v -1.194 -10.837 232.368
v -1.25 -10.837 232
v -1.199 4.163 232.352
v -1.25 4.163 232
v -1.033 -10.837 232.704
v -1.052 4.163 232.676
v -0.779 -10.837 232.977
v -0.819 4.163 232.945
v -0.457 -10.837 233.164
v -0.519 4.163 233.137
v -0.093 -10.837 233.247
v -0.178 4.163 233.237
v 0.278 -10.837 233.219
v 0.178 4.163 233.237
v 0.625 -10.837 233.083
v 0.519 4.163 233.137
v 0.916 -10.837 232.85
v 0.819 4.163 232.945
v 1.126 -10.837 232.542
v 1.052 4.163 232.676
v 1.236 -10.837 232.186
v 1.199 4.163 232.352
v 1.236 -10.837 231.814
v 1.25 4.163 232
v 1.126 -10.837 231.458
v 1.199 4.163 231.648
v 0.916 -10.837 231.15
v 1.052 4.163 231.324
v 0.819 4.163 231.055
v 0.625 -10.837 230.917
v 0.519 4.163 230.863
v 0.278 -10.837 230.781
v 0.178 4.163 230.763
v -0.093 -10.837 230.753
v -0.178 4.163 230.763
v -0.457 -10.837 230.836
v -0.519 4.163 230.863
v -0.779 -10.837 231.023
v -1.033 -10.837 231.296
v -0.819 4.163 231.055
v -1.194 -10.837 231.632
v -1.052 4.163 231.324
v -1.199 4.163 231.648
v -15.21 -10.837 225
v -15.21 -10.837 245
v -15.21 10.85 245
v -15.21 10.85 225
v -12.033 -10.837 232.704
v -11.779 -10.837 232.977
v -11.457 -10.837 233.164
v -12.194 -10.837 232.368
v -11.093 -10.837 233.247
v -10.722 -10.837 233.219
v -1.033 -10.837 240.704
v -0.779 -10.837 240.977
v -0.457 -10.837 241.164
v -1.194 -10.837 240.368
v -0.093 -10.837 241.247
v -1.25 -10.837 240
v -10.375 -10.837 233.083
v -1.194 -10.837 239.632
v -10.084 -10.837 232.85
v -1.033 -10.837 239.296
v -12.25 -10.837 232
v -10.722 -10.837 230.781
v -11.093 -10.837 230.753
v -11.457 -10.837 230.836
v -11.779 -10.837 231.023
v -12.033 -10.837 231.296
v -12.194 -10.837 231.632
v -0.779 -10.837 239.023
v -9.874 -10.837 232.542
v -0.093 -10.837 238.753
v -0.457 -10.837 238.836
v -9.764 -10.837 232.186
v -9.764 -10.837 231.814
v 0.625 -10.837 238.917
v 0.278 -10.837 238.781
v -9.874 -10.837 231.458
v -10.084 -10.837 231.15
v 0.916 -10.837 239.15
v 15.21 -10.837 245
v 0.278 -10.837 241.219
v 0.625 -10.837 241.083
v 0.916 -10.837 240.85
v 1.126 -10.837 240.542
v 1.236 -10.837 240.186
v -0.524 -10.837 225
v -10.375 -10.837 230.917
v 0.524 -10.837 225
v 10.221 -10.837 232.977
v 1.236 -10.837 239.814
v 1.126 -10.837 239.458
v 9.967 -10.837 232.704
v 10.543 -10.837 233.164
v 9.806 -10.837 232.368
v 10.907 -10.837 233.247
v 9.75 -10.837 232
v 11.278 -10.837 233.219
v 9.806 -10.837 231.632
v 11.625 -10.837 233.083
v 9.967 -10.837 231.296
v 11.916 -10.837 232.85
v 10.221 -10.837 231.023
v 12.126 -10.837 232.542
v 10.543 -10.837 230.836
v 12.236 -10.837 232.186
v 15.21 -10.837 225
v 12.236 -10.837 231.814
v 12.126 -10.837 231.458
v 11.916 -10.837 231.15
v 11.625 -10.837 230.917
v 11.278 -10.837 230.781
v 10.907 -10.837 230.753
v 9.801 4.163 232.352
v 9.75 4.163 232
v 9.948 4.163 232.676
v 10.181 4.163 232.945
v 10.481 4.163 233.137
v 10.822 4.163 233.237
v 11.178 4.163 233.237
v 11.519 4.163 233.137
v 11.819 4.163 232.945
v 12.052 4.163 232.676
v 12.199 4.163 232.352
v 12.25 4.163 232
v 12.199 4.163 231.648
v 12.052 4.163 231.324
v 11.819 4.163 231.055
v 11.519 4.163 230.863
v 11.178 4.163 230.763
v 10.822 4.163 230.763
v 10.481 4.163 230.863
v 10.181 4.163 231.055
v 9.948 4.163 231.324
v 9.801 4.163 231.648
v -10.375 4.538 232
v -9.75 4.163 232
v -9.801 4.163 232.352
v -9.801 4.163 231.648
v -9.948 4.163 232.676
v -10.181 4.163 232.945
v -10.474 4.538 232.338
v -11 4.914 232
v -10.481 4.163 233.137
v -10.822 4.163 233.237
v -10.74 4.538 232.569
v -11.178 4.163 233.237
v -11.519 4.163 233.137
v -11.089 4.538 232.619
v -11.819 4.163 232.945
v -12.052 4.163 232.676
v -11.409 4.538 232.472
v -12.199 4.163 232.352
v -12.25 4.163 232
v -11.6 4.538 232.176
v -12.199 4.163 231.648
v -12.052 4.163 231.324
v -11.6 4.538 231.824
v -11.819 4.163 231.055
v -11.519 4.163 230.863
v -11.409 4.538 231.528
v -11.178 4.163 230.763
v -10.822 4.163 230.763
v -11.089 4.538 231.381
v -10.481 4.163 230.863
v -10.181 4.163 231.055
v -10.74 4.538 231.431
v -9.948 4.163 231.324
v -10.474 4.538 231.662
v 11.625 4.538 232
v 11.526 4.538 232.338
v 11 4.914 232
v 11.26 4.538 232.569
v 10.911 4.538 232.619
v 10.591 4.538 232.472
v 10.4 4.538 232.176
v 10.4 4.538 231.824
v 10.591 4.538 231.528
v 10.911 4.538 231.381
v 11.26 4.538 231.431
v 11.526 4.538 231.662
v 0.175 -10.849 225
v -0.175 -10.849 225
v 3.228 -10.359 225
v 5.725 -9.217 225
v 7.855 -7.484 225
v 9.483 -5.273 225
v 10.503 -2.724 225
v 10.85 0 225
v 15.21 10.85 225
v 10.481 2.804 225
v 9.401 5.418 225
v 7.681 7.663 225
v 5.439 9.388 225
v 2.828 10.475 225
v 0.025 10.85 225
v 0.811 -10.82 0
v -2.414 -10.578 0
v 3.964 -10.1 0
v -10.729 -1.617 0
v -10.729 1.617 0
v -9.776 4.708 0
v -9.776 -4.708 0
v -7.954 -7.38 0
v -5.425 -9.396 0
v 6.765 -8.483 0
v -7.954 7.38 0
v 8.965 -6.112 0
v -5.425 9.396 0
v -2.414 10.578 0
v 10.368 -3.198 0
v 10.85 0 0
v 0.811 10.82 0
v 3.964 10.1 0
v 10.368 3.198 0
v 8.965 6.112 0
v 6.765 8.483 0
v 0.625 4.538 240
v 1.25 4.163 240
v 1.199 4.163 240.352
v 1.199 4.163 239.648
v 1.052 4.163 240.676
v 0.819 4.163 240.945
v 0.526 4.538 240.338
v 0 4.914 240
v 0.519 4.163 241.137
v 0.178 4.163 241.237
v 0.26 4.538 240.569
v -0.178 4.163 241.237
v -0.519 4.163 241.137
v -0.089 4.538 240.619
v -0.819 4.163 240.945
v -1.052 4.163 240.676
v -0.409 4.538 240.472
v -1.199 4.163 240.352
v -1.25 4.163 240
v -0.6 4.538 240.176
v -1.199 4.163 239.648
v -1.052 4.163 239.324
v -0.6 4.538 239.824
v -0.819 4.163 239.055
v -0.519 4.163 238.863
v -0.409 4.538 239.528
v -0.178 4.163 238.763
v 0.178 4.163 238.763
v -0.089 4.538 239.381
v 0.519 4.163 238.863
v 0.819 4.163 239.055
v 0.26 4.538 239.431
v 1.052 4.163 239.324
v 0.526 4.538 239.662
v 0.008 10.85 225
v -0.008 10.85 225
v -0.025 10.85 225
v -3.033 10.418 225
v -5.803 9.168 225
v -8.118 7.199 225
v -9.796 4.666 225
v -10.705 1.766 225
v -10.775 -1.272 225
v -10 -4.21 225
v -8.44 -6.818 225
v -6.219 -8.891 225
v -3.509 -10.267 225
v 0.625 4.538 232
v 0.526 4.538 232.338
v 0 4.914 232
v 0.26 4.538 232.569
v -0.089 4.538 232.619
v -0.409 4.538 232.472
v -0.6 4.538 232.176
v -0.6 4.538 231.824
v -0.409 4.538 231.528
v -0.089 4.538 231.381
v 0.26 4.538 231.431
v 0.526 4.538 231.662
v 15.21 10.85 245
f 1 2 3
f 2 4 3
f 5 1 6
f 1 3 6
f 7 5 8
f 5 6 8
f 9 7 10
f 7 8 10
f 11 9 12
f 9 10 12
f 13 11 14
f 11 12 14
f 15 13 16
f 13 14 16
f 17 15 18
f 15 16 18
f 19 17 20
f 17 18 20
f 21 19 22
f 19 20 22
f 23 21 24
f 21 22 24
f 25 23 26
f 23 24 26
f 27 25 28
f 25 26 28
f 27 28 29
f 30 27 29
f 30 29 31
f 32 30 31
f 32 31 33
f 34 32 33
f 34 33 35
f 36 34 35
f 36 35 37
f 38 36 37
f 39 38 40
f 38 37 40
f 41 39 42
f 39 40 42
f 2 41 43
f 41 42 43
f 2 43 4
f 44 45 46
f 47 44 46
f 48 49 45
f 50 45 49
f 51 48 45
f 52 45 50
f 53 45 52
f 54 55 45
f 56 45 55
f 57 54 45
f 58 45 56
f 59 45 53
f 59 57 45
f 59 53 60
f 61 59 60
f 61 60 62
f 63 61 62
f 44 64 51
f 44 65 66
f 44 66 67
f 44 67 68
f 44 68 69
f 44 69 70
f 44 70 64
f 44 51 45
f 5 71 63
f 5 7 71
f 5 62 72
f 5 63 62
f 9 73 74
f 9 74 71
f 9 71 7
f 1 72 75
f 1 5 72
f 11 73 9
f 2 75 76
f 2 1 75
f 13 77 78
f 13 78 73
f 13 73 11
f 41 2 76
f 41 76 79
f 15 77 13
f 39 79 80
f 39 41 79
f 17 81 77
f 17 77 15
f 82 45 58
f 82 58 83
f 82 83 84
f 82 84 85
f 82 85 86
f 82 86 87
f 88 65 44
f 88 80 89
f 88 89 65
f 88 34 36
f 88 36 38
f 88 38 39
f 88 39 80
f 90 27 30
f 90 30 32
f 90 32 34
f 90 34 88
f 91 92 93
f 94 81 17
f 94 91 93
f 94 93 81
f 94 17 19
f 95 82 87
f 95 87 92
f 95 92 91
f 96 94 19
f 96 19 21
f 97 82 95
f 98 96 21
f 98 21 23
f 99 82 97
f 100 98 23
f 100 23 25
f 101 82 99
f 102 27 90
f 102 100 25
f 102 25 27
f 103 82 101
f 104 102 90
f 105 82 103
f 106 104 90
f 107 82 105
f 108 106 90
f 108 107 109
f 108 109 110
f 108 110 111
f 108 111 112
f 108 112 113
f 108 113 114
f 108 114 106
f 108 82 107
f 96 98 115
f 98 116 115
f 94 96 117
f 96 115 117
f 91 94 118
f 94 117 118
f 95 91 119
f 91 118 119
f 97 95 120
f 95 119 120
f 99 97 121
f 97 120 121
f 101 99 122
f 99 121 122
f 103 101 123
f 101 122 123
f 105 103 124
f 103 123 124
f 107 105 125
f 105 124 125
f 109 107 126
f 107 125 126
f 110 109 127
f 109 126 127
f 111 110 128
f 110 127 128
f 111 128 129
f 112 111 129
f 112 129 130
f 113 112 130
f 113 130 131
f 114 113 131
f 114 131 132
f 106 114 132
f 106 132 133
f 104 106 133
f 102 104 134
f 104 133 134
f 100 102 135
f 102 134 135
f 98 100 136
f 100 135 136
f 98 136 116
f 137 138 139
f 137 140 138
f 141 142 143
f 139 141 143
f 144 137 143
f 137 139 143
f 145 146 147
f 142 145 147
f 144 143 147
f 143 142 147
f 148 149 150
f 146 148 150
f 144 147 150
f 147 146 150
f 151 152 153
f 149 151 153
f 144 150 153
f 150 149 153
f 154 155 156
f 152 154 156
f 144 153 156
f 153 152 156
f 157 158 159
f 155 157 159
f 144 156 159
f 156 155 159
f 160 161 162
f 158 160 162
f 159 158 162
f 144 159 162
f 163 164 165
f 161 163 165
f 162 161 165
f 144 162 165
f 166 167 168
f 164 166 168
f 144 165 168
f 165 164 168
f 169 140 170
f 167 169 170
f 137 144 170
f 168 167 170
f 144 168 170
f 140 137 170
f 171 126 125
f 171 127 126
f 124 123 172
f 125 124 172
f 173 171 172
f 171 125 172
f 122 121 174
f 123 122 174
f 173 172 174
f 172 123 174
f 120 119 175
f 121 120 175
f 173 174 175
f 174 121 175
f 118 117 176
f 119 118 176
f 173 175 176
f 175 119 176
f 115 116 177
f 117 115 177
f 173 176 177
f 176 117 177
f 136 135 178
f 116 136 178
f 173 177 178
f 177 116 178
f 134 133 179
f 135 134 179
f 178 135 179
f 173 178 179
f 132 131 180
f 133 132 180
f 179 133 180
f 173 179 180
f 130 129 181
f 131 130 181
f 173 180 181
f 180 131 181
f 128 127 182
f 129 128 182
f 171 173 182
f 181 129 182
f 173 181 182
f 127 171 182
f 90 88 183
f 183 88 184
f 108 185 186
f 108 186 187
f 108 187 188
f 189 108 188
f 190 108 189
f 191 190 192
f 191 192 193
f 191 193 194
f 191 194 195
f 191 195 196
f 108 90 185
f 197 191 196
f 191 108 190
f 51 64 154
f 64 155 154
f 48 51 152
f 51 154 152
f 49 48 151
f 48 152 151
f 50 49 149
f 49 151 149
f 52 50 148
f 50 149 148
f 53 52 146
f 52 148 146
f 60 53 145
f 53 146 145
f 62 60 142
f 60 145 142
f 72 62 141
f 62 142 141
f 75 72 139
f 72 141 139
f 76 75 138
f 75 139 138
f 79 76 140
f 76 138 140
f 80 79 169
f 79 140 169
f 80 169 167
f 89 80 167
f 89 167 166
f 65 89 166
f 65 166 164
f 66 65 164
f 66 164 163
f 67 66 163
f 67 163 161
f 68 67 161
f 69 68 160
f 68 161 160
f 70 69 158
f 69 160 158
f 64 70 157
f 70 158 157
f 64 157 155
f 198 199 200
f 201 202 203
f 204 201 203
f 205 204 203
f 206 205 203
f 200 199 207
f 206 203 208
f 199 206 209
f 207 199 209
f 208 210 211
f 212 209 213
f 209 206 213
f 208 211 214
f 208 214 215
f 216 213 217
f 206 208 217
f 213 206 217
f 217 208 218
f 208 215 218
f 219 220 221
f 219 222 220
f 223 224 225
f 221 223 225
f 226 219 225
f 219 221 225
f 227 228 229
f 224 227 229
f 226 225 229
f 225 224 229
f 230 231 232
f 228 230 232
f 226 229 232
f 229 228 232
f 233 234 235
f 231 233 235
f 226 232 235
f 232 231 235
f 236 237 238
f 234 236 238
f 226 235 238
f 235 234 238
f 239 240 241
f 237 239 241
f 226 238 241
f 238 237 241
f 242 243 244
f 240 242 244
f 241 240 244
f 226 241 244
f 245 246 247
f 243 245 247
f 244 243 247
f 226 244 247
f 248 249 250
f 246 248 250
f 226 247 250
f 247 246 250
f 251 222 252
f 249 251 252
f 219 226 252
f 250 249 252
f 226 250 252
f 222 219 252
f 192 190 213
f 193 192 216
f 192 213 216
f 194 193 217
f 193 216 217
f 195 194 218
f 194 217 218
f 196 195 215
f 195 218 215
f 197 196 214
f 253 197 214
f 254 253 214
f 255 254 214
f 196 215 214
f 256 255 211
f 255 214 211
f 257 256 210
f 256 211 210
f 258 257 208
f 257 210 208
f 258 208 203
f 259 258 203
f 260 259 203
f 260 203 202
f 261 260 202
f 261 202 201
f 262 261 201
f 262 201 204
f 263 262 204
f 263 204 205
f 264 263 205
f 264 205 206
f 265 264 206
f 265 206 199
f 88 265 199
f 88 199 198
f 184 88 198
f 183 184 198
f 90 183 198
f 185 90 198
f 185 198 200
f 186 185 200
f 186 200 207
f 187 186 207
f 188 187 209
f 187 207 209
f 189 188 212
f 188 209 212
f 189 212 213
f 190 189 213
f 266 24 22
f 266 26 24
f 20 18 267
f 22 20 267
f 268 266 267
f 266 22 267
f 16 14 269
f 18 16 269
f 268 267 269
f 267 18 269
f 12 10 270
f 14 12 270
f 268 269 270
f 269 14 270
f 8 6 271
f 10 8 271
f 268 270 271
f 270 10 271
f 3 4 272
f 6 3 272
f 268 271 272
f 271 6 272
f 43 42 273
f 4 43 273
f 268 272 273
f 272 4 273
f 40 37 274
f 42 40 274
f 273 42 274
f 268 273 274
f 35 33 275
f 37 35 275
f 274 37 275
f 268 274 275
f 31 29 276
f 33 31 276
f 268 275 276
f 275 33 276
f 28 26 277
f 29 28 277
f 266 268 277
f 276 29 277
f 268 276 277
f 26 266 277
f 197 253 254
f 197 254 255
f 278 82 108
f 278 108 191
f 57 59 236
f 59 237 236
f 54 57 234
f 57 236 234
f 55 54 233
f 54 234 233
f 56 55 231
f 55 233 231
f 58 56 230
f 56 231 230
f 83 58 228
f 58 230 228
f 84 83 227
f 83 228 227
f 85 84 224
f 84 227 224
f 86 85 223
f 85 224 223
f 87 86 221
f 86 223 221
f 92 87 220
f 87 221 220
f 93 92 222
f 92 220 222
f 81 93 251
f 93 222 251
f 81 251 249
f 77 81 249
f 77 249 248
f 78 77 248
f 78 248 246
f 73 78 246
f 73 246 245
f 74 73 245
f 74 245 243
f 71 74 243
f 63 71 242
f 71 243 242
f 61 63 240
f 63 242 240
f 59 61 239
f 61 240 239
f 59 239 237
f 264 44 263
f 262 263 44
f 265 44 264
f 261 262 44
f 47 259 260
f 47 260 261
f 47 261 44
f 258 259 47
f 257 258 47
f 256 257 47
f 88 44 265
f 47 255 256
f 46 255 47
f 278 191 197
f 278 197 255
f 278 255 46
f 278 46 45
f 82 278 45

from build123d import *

# Parameters (mm, degrees)
F0_R     = 10.85
F1_DEPTH = 225
F4_DEPTH = 15.21
F6_D     = 2.5
F6_DEPTH = 15
F6_TIP   = 0.7510757738


with BuildPart() as f1:
    # F0 (on Top) → F1 (new body)
    with BuildSketch(Plane.XY):
        Circle(F0_R)
    extrude(amount=F1_DEPTH)

    # F3 (on face) → F4 (join, symmetric)
    with BuildSketch(Plane.YZ):
        Polygon((-10.8373243377, 245), (-10.8373243377, 225), (10.8499713242, 225), align=None)
        Polygon((10.8499713242, 245), (-10.8373243377, 245), (10.8499713242, 225), align=None)
    extrude(amount=F4_DEPTH, both=True)

    # F6
    with Locations(Plane.XZ.offset(10.8373243377)):
        with Locations((11, 232), (0, 232), (-11, 232), (0, 240)):
            Hole(F6_D / 2, depth=F6_DEPTH)
            with Locations((0, 0, -(F6_DEPTH + F6_TIP / 2))):  # 118° drill point
                Cone(0, F6_D / 2, F6_TIP, mode=Mode.SUBTRACT)


solid = f1.part
